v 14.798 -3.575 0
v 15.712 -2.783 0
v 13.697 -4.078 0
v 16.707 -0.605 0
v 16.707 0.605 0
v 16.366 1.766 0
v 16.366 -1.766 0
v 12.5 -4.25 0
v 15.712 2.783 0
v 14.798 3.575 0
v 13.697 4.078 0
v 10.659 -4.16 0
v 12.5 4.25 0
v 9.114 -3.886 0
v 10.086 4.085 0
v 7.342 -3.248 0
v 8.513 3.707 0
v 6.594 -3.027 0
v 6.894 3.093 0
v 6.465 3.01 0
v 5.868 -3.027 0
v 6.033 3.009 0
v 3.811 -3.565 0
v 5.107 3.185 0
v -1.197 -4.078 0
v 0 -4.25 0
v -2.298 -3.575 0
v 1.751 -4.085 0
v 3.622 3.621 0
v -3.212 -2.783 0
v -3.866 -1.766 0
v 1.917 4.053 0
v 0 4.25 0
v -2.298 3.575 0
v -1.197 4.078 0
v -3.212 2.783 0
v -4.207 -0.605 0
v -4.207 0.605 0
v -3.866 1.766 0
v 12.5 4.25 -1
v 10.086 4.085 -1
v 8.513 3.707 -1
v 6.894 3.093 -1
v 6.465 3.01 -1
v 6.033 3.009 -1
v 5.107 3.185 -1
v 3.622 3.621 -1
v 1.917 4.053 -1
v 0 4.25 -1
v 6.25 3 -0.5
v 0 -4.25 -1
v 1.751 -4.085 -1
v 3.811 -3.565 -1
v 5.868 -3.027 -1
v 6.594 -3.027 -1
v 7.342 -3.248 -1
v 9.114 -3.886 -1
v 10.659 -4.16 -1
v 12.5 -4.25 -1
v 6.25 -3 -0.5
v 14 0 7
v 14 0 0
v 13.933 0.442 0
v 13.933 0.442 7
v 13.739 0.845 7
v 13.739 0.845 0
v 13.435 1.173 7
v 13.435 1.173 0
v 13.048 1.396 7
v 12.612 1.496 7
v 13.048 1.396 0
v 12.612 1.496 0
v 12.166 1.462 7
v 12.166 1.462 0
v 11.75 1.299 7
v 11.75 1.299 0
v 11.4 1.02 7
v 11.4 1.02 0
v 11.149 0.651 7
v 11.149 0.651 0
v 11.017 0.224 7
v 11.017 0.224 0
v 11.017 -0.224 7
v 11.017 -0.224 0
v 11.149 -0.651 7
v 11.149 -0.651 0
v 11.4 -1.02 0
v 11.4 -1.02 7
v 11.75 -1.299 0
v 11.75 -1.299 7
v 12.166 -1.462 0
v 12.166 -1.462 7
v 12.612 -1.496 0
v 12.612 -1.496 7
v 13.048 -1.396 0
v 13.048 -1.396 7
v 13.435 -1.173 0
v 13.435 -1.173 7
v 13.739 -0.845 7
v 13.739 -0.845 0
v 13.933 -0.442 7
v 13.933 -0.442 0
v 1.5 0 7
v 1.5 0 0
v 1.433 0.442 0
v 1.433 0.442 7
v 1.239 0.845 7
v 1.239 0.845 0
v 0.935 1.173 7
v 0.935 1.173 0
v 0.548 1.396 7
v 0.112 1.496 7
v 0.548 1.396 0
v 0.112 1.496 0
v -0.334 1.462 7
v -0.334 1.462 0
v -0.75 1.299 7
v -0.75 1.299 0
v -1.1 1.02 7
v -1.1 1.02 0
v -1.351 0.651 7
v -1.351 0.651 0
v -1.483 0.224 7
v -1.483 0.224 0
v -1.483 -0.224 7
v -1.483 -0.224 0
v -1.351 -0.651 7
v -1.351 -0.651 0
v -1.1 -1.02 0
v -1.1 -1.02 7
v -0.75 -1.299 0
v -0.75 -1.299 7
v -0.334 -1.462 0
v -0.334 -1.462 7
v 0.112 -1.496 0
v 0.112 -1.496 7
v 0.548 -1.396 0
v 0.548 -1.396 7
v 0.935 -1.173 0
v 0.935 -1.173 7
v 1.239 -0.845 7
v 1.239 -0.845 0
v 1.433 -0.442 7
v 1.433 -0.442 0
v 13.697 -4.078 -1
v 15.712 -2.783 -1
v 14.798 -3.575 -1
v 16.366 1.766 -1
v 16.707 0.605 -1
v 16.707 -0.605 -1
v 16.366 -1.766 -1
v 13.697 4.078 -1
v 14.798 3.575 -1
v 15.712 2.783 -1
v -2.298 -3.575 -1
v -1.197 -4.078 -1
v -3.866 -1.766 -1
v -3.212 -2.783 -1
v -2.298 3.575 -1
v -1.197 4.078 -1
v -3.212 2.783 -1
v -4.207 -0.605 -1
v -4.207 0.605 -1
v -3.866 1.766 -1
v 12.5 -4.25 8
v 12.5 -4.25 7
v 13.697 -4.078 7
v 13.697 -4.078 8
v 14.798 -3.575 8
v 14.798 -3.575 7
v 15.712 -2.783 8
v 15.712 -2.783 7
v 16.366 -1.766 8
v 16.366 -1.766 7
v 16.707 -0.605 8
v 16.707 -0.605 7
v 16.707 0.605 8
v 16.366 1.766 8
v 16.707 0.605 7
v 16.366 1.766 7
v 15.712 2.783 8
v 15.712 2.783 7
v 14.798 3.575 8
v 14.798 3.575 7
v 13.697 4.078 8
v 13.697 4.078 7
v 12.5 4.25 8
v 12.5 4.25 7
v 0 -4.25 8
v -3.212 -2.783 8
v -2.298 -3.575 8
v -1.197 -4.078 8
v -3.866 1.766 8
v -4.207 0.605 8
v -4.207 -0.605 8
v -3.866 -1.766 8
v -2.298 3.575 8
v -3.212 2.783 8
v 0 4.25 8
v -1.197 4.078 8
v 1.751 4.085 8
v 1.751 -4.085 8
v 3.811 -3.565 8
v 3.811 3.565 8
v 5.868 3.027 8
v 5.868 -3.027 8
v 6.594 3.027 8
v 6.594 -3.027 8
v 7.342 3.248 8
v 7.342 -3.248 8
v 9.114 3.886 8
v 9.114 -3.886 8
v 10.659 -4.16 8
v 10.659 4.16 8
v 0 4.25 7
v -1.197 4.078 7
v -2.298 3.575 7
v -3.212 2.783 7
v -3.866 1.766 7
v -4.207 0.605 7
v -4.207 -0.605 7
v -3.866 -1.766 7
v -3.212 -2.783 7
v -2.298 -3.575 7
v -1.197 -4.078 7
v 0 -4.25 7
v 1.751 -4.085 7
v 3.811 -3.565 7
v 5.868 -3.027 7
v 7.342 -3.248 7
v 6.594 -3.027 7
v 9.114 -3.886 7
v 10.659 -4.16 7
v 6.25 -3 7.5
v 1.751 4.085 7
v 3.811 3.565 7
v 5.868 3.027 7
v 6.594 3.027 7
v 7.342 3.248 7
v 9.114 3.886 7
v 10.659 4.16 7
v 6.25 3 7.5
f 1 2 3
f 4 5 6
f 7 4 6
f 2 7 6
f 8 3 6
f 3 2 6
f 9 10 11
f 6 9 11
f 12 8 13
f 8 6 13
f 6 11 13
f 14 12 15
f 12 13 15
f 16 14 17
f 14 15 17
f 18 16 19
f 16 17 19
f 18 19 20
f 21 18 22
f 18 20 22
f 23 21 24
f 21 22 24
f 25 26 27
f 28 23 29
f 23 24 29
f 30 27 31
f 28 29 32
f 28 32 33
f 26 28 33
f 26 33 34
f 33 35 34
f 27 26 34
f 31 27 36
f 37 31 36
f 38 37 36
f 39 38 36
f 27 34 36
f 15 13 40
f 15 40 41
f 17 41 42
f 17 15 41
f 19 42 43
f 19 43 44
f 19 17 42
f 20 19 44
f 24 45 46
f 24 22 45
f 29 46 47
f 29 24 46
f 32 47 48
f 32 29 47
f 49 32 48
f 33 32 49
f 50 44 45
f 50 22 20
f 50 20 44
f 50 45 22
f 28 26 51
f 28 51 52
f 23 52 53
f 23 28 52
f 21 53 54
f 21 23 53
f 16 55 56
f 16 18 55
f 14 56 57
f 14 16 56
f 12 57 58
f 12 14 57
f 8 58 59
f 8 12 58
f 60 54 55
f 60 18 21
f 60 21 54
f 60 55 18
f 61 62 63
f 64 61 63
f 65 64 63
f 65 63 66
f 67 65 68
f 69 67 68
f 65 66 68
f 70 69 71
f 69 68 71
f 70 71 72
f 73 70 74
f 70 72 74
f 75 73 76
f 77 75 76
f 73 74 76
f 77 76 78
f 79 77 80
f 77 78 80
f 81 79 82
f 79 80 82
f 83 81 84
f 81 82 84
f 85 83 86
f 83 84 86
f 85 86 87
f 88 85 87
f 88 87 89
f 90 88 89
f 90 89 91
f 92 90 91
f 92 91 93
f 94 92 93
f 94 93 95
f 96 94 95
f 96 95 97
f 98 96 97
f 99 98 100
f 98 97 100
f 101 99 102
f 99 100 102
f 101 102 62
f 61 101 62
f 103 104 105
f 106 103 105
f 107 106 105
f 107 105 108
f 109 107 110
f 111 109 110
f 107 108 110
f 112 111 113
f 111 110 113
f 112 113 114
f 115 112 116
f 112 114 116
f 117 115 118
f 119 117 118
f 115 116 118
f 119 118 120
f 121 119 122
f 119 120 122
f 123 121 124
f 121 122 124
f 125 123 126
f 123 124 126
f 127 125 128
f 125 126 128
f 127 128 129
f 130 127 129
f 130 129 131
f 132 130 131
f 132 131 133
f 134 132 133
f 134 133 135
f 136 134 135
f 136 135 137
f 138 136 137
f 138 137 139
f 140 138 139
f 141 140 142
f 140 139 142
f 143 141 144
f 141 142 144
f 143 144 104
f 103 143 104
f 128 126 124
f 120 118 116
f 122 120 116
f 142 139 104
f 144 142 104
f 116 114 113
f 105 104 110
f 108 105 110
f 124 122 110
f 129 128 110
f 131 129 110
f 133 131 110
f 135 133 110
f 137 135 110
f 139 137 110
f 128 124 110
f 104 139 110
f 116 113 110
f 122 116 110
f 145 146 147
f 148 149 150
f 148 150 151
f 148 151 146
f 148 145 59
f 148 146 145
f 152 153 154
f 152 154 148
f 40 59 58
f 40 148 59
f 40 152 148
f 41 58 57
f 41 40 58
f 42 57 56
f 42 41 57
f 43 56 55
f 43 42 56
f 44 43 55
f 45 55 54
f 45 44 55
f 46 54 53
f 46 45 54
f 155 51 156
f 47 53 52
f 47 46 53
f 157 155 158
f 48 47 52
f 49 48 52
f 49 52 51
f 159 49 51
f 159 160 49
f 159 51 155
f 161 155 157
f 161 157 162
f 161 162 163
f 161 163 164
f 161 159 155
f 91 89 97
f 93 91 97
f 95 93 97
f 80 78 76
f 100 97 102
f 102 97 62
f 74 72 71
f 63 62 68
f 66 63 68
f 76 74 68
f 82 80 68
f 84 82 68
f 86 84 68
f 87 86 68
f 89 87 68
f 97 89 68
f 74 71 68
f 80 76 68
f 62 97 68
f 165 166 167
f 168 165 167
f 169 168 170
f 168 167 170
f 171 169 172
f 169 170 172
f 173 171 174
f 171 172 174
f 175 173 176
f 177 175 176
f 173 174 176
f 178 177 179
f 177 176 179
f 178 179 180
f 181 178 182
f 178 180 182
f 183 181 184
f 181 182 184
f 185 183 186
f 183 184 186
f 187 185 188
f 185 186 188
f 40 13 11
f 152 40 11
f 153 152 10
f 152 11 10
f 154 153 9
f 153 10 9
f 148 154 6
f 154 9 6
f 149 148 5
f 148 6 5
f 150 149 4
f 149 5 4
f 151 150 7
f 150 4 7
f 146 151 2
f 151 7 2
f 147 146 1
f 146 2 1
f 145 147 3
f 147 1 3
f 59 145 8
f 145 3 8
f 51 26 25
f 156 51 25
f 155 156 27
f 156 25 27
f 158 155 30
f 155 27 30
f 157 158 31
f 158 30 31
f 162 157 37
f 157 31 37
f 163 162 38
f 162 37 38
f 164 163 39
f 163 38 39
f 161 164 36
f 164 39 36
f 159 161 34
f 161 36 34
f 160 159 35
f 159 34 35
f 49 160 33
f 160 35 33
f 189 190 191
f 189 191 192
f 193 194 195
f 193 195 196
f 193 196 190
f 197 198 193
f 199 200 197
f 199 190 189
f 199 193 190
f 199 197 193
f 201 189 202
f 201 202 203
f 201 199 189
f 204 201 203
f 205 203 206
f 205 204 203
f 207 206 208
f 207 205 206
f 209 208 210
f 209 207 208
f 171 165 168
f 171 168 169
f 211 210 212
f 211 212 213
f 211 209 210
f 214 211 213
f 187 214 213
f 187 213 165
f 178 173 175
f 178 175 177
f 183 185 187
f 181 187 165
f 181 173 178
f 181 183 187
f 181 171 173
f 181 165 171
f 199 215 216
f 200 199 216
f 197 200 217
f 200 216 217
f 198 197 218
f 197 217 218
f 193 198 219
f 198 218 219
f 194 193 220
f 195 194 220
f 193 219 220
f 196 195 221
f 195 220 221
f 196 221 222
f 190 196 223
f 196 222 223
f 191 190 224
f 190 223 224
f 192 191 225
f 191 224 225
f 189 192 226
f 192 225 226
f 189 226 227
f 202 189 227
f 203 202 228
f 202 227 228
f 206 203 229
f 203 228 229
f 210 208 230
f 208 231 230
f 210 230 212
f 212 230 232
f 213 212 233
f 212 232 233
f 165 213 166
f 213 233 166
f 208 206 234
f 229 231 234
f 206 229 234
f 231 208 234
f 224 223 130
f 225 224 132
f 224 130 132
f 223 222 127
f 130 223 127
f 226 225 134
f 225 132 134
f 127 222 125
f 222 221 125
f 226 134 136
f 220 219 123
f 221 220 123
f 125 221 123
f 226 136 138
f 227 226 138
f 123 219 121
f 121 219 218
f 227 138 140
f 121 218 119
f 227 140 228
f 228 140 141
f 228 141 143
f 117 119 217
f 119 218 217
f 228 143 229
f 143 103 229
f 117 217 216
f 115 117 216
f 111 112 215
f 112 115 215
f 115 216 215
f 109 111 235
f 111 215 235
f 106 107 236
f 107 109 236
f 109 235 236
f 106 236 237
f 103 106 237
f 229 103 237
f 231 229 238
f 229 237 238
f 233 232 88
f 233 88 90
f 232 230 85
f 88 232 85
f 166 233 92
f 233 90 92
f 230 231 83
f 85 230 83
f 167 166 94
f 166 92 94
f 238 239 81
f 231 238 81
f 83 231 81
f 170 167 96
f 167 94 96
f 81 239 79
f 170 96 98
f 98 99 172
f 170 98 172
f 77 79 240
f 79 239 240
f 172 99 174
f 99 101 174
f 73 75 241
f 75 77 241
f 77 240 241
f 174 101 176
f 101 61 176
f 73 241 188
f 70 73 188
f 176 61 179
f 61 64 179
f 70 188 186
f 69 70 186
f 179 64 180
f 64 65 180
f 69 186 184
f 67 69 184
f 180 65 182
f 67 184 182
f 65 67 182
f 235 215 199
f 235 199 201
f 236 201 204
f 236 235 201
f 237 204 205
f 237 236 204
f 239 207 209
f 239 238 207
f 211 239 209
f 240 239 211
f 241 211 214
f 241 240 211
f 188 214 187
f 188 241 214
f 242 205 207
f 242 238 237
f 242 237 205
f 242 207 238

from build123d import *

# Parameters (mm, degrees)
SKETCH1_R             = 1.5
BOSS_EXTRUDE1_DEPTH   = 7
BOSS_EXTRUDE1_2_DEPTH = 7
BOSS_EXTRUDE2_DEPTH   = 1
BOSS_EXTRUDE3_DEPTH   = 1


with BuildPart() as part:
    # Sketch1 → Boss-Extrude1 (new body)
    with BuildSketch(Plane.XY):
        Circle(SKETCH1_R)
    extrude(amount=BOSS_EXTRUDE1_DEPTH)



with BuildPart() as body_2:
    # Sketch1 → Boss-Extrude1 2 (new body)
    with BuildSketch(Plane.XY):
        with Locations((12.5, 0)):
            Circle(SKETCH1_R)
    extrude(amount=BOSS_EXTRUDE1_2_DEPTH)


with BuildPart() as part_1:
    add(part.part)

    add(body_2.part)  # Boss-Extrude2 merges body 2
    # Sketch2 → Boss-Extrude2 (add)
    with BuildSketch(Plane.XY.offset(7)):
        with BuildLine():
            ThreePointArc((0, 4.25), (-4.25, 0), (0, -4.25))
            add(Edge.make_bspline(
                [(0, -4.25), (2.67403161, -4.25), (7.063884677, -1.75), (8.198199037, -4.25), (12.5, -4.25)],
                knots=[0, 0, 0, 0, 0.5, 1, 1, 1, 1], degree=3))
            ThreePointArc((12.5, -4.25), (16.75, 0), (12.5, 4.25))
            add(Edge.make_bspline(
                [(0, 4.25), (2.67403161, 4.25), (7.063884677, 1.75), (8.198199037, 4.25), (12.5, 4.25)],
                knots=[0, 0, 0, 0, 0.5, 1, 1, 1, 1], degree=3))
        make_face()
    extrude(amount=BOSS_EXTRUDE2_DEPTH)


with BuildPart() as body_2_2:
    # Sketch3 → Boss-Extrude3 (new body)
    with BuildSketch(Plane(origin=(0, 0, 0), x_dir=(-1, 0, 0), z_dir=(0, 0, -1))):
        with BuildLine():
            ThreePointArc((0, -4.25), (4.25, 0), (0, 4.25))
            add(Edge.make_bspline(
                [(-12.5, 4.25), (-8.198199037, 4.25), (-7.063884677, 1.75), (-2.67403161, 4.25), (0, 4.25)],
                knots=[0, 0, 0, 0, 0.5, 1, 1, 1, 1], degree=3))
            ThreePointArc((-12.5, 4.25), (-16.75, 0), (-12.5, -4.25))
            add(Edge.make_bspline(
                [(0, -4.25), (-2.67403161, -4.25), (-7.063884677, -1.75), (-8.198199037, -4.25), (-12.5, -4.25)],
                knots=[0, 0, 0, 0, 0.5, 1, 1, 1, 1], degree=3))
        make_face()
    extrude(amount=BOSS_EXTRUDE3_DEPTH)


solid = Compound([part_1.part, body_2_2.part])
